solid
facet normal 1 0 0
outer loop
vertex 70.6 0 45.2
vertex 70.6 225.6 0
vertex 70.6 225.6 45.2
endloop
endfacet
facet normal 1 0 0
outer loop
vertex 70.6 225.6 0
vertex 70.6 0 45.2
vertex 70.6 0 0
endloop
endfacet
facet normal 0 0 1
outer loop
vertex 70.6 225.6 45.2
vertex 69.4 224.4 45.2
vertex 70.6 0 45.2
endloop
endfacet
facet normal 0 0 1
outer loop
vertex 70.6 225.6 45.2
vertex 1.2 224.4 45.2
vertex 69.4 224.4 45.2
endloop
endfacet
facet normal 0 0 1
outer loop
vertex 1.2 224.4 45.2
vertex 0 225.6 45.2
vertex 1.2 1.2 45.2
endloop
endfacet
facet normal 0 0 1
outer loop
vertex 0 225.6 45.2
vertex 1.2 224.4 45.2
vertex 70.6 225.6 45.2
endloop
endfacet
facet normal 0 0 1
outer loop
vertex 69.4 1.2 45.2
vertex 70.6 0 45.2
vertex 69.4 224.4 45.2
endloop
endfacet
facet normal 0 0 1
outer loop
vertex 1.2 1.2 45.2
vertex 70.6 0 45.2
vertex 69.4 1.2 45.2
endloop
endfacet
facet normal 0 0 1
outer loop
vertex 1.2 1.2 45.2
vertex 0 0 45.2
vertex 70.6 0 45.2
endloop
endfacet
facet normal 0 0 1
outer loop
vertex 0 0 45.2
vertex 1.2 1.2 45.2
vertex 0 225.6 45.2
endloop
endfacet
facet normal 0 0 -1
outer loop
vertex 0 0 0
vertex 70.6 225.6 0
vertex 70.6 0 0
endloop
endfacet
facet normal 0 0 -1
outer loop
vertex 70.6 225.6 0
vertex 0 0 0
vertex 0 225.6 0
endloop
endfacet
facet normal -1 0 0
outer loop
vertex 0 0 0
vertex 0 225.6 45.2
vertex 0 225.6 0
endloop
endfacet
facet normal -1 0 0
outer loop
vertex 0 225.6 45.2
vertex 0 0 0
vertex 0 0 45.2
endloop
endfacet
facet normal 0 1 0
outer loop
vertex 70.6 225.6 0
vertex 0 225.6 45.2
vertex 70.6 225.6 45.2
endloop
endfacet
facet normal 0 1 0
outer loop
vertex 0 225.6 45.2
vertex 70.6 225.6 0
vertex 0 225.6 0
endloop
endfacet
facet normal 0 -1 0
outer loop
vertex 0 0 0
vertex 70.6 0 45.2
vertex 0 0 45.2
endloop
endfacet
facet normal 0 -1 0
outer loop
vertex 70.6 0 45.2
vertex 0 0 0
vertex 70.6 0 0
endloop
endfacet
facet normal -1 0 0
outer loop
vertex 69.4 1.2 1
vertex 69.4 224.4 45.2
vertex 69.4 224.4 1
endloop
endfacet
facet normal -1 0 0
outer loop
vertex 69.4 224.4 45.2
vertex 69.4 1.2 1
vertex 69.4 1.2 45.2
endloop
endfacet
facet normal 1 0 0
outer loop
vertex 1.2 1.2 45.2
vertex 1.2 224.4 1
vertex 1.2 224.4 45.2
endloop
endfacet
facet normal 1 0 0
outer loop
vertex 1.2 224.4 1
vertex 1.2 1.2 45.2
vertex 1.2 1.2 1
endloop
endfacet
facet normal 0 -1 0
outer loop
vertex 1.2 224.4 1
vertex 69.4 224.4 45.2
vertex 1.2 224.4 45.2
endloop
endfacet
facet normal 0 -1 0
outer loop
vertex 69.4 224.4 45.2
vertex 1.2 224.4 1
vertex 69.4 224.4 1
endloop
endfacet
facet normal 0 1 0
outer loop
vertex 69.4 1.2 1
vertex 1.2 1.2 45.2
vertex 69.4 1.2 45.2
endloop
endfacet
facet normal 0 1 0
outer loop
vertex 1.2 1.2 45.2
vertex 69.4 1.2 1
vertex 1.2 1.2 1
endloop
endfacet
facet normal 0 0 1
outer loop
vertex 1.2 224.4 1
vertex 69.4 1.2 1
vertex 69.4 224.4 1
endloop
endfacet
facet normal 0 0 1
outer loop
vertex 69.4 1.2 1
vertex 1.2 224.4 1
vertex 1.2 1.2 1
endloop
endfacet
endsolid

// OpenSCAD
// Modulith (Jerrari Gen2) drawer insert generator
// Drop-in dividers for Modulith drawers, with or without a floor. Options follow Gridfinity Extended's
// basic cup where they apply (no lip, stacking, magnets or base pads).
// License: CC BY-NC-SA 4.0 (https://creativecommons.org/licenses/by-nc-sa/4.0/). Original work; not affiliated with Jerrari.
//
// Cavity formulas measured from the v2609 "decor drawer" STLs (59-270 deep, 1W-4W, 0.5H-2H):
//   width = 88*W - 17    depth = D - 14    height (floor top to rim) = 56*H - 7.8
// Drawer floor 1.8 thick, square cavity corners, no inside fillets or ribs. 2H drawers thin the side
// walls 0.4 mm mid-height; the rim still gates at 88W-17. Case: rim-to-ceiling gap 0.8 mm; stopper pins
// in the center floor rib hang 2 mm below the ceiling.
//
// Axes: X = width, Y = depth (Y=0 is the drawer front), Z up. Origin = outer front-left-bottom.
// Separator positions and spans may be given as negative percentages of the inner span (-50 = 50%).

/* [Drawer] */
// Modulith depth series
drawer_depth = 240; // [59, 115, 165, 185, 240, 270]
// Drawer width in Modulith units (1-4 measured, others extrapolated)
drawer_width = 1; // 0.5
// Drawer height in Modulith units (0.5-2 measured, others extrapolated)
drawer_height = 1; // [0.5, 1, 1.5, 2, 2.5, 3]
// Insert height; 0 = as tall as the drawer allows (see Fit Tweaking for headroom)
height = 0; // 0.1
// Case stopper pins hang into the drawer; when fitted, stopper depth is added to the headroom
drawer_stoppers = true;
// Curve smoothness of the model: draft renders fastest, fine is smoothest (slower)
quality = "normal"; // [draft, normal, fine]

/* [Perimeter Walls and Floor] */
// Outer wall thickness, mm. 0 = no outer walls, just dividers
wall_thickness = 1.2; // 0.1
// Floor thickness, mm. 0 = no floor
floor_thickness = 1.0; // 0.1

/* [Subdivisions] */
// Equal pockets across the width (dividers run front to back)
vertical_chambers = 1;
// Equal pockets front to back (dividers run left to right)
horizontal_chambers = 1;
// Place front-to-back dividers yourself instead of equally
vertical_irregular_subdivisions = false;
// Each divider: position from the left inner wall, or [position, from, to] for a partial divider measured
// from the front inner wall (to = 0 reaches the back). Negative values are percentages: -50 = 50%.
vertical_separator_config = [20, 45];
// Place left-to-right dividers yourself instead of equally
horizontal_irregular_subdivisions = false;
// Each divider: position from the front inner wall, or [position, from, to] measured from the left inner wall
horizontal_separator_config = [60, 120];

/* [Label] */
// normal = a shelf to stick a label on; pred = socket for pred's printable snap-in labels (Printables 592545)
label_style = "disabled"; // [disabled, normal, pred]
// Where the label sits along the wall; the *chamber options give every pocket its own label
label_position = "left"; // [left, right, center, leftchamber, rightchamber, centerchamber]
// Label shelf: width (0 = full wall or pocket), depth, height (0 = same as depth), edge radius; mm
label_size = [0, 14, 0, 0.8]; // 0.1
// Pocket in the shelf: width, depth, pocket depth; mm. 0 = fit the stock 1U pred label (normal: 0 = no pocket)
label_relief = [0, 0, 0]; // 0.1
// Outer walls that get labels: front, back, left, right
label_walls = [0, 1, 0, 0]; // [0:1:1]
// Labels on dividers too: on the front face of left-to-right dividers, the left face of front-to-back ones
label_dividers = "disabled"; // [disabled, horizontal, vertical, both]

/* [Finger Slide] */
// Rounded or sloped fill where the floor meets a wall, so small parts slide out to your fingers
fingerslide = "none"; // [none, rounded, chamfered]
// Size of the slide, mm; negative = a fraction of the pocket (-3 = one third)
fingerslide_radius = -3;
// Sides of each pocket that get a slide: front, back, left, right
fingerslide_walls = [1, 0, 0, 0]; // [0:1:1]

/* [Wall Cutout] */
// Finger notches in left-to-right walls: outer front/back and/or the dividers between pocket rows
wallcutout_vertical = "disabled"; // [disabled, enabled, inneronly, wallsonly, frontonly, backonly]
// Finger notches in front-to-back walls: outer left/right and/or the dividers between pocket columns
wallcutout_horizontal = "disabled"; // [disabled, enabled, inneronly, wallsonly, leftonly, rightonly]
// Where along each pocket, mm from its start; -2 = centered (other negatives = a fraction)
wallcutout_position = -2; // 0.1
// Notch width at its bottom, mm; 0 = half the pocket
wallcutout_width = 0; // 0.1
// Slope of the notch sides, degrees from horizontal
wallcutout_angle = 70;
// Notch depth from the top, mm; 0 = halfway down, -1 = to the floor
wallcutout_height = 0; // 0.1
// Rounding of the notch corners, mm
wallcutout_corner_radius = 5; // 0.1

/* [Bottom Text] */
// Engrave the drawer size on the underside (needs a floor)
text_1 = false;
// Engrave your own line too
text_2 = false;
text_2_text = "";
// Letter height, mm; 0 = automatic
text_size = 0; // 0.1
// Engraving depth, mm
text_depth = 0.3; // 0.01
text_font = "Liberation Sans";

/* [Fit Tweaking] */
// Fit slack: total mm removed from the insert's width and depth
clearance = [0.4, 0.4]; // 0.1
// Gap kept between the insert top and the drawer rim when height is 0 or a %; stopper depth is added to it if stoppers are on
headroom = 1.0; // 0.1
// How far the case stopper reaches below the ceiling, mm (used when drawer stoppers is on)
stopper_depth = 2; // 0.1
// Divider thickness at the bottom and top, mm; a thinner top makes a tapered divider
chamber_wall_thickness = [1.2, 1.2]; // 0.1
// Dividers end this far below the insert top, mm
chamber_wall_headroom = 0; // 0.1

/* [OpenSCAD Detail] */
// Expert override of quality: OpenSCAD $fa / $fs / $fn; 0 = set by quality
fa = 0;
fs = 0;
fn = 0;

/* [Hidden] */
q = quality == "draft" ? [12, 1] : quality == "fine" ? [3, 0.2] : [6, 0.4];   // [$fa, $fs] per quality
$fa = fa > 0 ? fa : q[0]; $fs = fs > 0 ? fs : q[1]; $fn = fn;
eps = 0.01;

// ---------------------------------------------------------------- derived sizes
cavity = [88 * drawer_width - 17, drawer_depth - 14, 56 * drawer_height - 7.8];
W = cavity.x - clearance.x;
D = cavity.y - clearance.y;
head = headroom + (drawer_stoppers ? stopper_depth : 0);
H = height > 0 ? height : (cavity.z - head) * (height < 0 ? -height / 100 : 1);
wt = wall_thickness;
ft = floor_thickness;
iw = W - 2 * wt;           // inner cavity of the insert
id = D - 2 * wt;
cwb = chamber_wall_thickness[0];
cwtop = chamber_wall_thickness[1];
sep_top = H - chamber_wall_headroom;

// separator centerlines, relative to the inner cavity origin
function equal_seps(n, len) = [for (i = [1 : 1 : n - 1]) i * (len - (n - 1) * cwb) / n + (i - 0.5) * cwb];
function rel(v, len) = v < 0 ? -v / 100 * len : v;                                    // -50 -> 50% of len
function sep_pos(e, across) = rel(is_list(e) ? e[0] : e, across);
// OpenSCAD has no sort(): quicksort the separator entries by position so they can be listed in any order
function by_pos(v, across) = len(v) <= 1 ? v : let (p = sep_pos(v[0], across), rest = [for (i = [1 : 1 : len(v) - 1]) v[i]])
    concat(by_pos([for (e = rest) if (sep_pos(e, across) < p) e], across), [v[0]], by_pos([for (e = rest) if (sep_pos(e, across) >= p) e], across));
xcfg = by_pos(vertical_irregular_subdivisions ? vertical_separator_config : equal_seps(vertical_chambers, iw), iw);
ycfg = by_pos(horizontal_irregular_subdivisions ? horizontal_separator_config : equal_seps(horizontal_chambers, id), id);
function sep_span(e, len) = is_list(e) ? [rel(e[1], len), e[2] == 0 ? len : rel(e[2], len)] : [0, len];   // [from, to] along the separator
xs = [for (e = xcfg) sep_pos(e, iw)];
ys = [for (e = ycfg) sep_pos(e, id)];
// several separators may share a position (different spans); grid lines are the distinct positions
function uniq(v) = [for (i = [0 : 1 : len(v) - 1]) if (i == 0 || v[i] - v[i - 1] > 0.01) v[i]];
// pockets along one wall face: the face's span split only at crossing separators that actually reach it.
// cross: crossing separators' configs/positions, cross_len: their length axis, at: this face's position on that
// axis, lo..hi: this wall's own span.
function touches(sp, at) = sp[0] <= at + 0.01 && sp[1] >= at - 0.01;
function wall_cells(cross, cross_pos, cross_len, at, lo, hi) = let (
    cuts = uniq([for (i = [0 : 1 : len(cross) - 1]) if (touches(sep_span(cross[i], cross_len), at) && cross_pos[i] > lo && cross_pos[i] < hi) cross_pos[i]]),
    edges = concat([lo], [for (c = cuts) each [c - cwb / 2, c + cwb / 2]], [hi]))
    [for (i = [0 : 2 : len(edges) - 2]) [edges[i], edges[i + 1]]];
// ponytail: cols x rows is still the full grid (chamber-size echo, slide radius). Wall-attached features (labels,
// slides, cutouts) use wall_cells() below, which only splits a wall where a separator really meets it.
// chamber spans [start, end] between separator faces
function spans(seps, len) = [for (i = [0 : len(seps)])
    [i == 0 ? 0 : seps[i - 1] + cwb / 2, i == len(seps) ? len : seps[i] - cwb / 2]];
uxs = uniq(xs); uys = uniq(ys);
cols = spans(uxs, iw);
rows = spans(uys, id);
function gi(v, list) = [for (i = [0 : 1 : len(list) - 1]) if (abs(list[i] - v) <= 0.01) i][0];   // grid-line index of a position

assert(search(drawer_depth, [59, 115, 165, 185, 240, 270]) != [], "drawer_depth must be 59/115/165/185/240/270");
assert(iw > 0 && id > 0 && H > ft, "insert has no interior");
assert(min([for (c = cols) c[1] - c[0]]) > 0 && min([for (r = rows) r[1] - r[0]]) > 0, "a chamber has zero or negative width");
assert(cwtop <= cwb, "chamber_wall_thickness top must be <= bottom (prints without support)");
assert(min(concat([1], [for (e = xcfg) let (sp = sep_span(e, id)) sp[1] - sp[0]], [for (e = ycfg) let (sp = sep_span(e, iw)) sp[1] - sp[0]])) > 0, "partial separator: 'to' must be beyond 'from'");

echo(str("Modulith ", drawer_depth, " ", drawer_width, "W ", drawer_height, "H  cavity=", cavity,
         "  insert=", [W, D, H], "  headroom=", head, "  chambers X=", [for (c = cols) c[1] - c[0]], " Y=", [for (r = rows) r[1] - r[0]]));

// ---------------------------------------------------------------- helpers
// Place children defined along +X (wall face at y=0, growing into +y, base at z=0) onto a wall.
// side: 0 front(+y), 1 back(-y), 2 left(+x), 3 right(-x). a0 = start along the wall, face = wall face coord.
module on_wall(side, a0, face, z) {
    if (side == 0) translate([a0, face, z]) children();
    if (side == 1) translate([a0, face, z]) mirror([0, 1, 0]) children();
    if (side == 2) translate([face, a0, z]) mirror([1, 0, 0]) rotate([0, 0, 90]) children();
    if (side == 3) translate([face, a0, z]) rotate([0, 0, 90]) children();
}
module prism_x(len) rotate([90, 0, 90]) linear_extrude(len) children();   // 2D (y,z) profile swept along +X

// chamber-side geometry: face coordinate of a chamber (c = column index, r = row index) on each side
function face(side, c, r) = side == 0 ? wt + rows[r][0] : side == 1 ? wt + rows[r][1]
                          : side == 2 ? wt + cols[c][0] : wt + cols[c][1];
function along(side, c, r) = side < 2 ? cols[c] : rows[r];      // span along the wall
function across(side, c, r) = side < 2 ? rows[r] : cols[c];     // span perpendicular to the wall

// position of a label of width lw within a span of length len
function label_offset(len, lw) =
    label_position == "right" || label_position == "rightchamber" ? len - lw
  : label_position == "center" || label_position == "centerchamber" ? (len - lw) / 2 : 0;
label_per_chamber = label_position == "leftchamber" || label_position == "rightchamber" || label_position == "centerchamber";
label_d = label_size[1];
label_h = label_size[2] == 0 ? label_d : label_size[2] == -1 ? label_d * 3 / 4 : label_size[2];
function label_w(len) = label_size[0] > 0 ? min(label_size[0], len) : len;

// ---------------------------------------------------------------- parts
// Floor. ponytail: flat slab; swap this body for a Gridfinity base / magnet pockets later.
module floor_slab() cube([W, D, ft]);

module perimeter() if (wt > 0) difference() {
    cube([W, D, H]);
    translate([wt, wt, -eps]) cube([iw, id, H + 2 * eps]);
}

// tapered separator: hull of a bottom slab and a top slab
module separator(along_y, pos, len) {
    hull() {
        translate(along_y ? [wt + pos - cwb / 2, wt, ft] : [wt, wt + pos - cwb / 2, ft])
            cube(along_y ? [cwb, len, eps] : [len, cwb, eps]);
        translate(along_y ? [wt + pos - cwtop / 2, wt, sep_top - eps] : [wt, wt + pos - cwtop / 2, sep_top - eps])
            cube(along_y ? [cwtop, len, eps] : [len, cwtop, eps]);
    }
}
module separators() {
    for (e = xcfg) let (sp = sep_span(e, id)) translate([0, sp[0], 0]) separator(true, sep_pos(e, iw), sp[1] - sp[0]);
    for (e = ycfg) let (sp = sep_span(e, iw)) translate([sp[0], 0, 0]) separator(false, sep_pos(e, id), sp[1] - sp[0]);
}

// label tab: 45-degree triangle rounded by r (GFX shape). pred cuts its socket into the top face:
// rounded pocket for the label body + a 6.7 mm slot 1 mm longer each side for the 1.9 x 5.7 snap tabs
// (measured from GridfinityBinLabel_X1_12_Blank.step: 37.8 x 11.5 x 0.8 overall, body 34.0). GFX's socket
// shape, but fixed to the stock label instead of stretched to the shelf width; X numbers equal GFX's for a 1U shelf.
label_r = label_size[3];
pred = label_style == "pred";
// socket [width, depth(Y), pocket depth]. pred: stock label; normal: sticker recess, off unless a pocket depth is given
sock_z = label_relief[2] > 0 ? label_relief[2] : pred ? 1 : 0;
sock_y = label_relief[1] > 0 ? label_relief[1] : pred ? 11.8 : label_d - label_r - 1.3;
function sock_x(len) = label_relief[0] > 0 ? label_relief[0] : pred ? 36.2 : len - 2;
sock_pad = pred ? 2 : 1;                  // tab length needed beyond the pocket: slots (1 each side) + 1 mm margin, or just the margin
socketed = sock_z > 0;
assert(!socketed || 2 * label_r >= sock_z + 0.6, "label socket: raise label_size[3] to >= (pocket depth + 0.6) / 2");
assert(!socketed || label_d - label_r - 0.3 - sock_y >= 0.5, "label socket: label_size[1] must be >= socket depth + radius + 0.8");

// positive: 45-degree triangle rounded by r (GFX shape), 0.05 overlap into the walls at each end
// (a tab that only touches a wall face leaves CGAL an internal interface)
module label_tab(len) translate([-0.05, 0, 0]) prism_x(len + 0.1)
    translate([0, -label_r]) offset(r = label_r) polygon([[0, 0], [label_d - label_r, 0], [0, -label_h]]);

// negative: pocket in the tab's top face, placed left/center/right inside the tab like the tab inside its wall.
// pred adds the 6.7 mm slots 1 mm past the pocket for the label's 1.9 x 5.7 snap tabs.
module label_socket(len) if (socketed) {
    sx = sock_x(len);
    assert(len >= sx + 2 * sock_pad, str("label socket needs ", sx + 2 * sock_pad, " mm of tab; this tab is ", len, " mm"));
    translate([sock_pad + label_offset(len - 2 * sock_pad, sx), label_d - label_r - 0.3 - sock_y, -sock_z]) {
        linear_extrude(sock_z + eps) offset(r = 1) offset(delta = -1) square([sx, sock_y]);
        if (pred) translate([-1, (sock_y - 6.7) / 2, 0]) cube([sx + 2, 6.7, sock_z + eps]);
    }
}

// one placement loop for both parts: part = "tab" (union) or "socket" (subtracted after the union, so a
// separator running under a tab never fills the pocket back in)
module label_part(part, len) { if (part == "tab") label_tab(len); else label_socket(len); }
module labels(part) if (label_style != "disabled") {
    // outer walls
    for (side = [0 : 3]) if (label_walls[side] != 0) {
        wall_face = side == 0 ? wt : side == 1 ? wt + id : side == 2 ? wt : wt + iw;
        chambers = !label_per_chamber ? (side < 2 ? [[0, iw]] : [[0, id]])
                 : side == 0 ? wall_cells(xcfg, xs, id, 0, 0, iw) : side == 1 ? wall_cells(xcfg, xs, id, id, 0, iw)
                 : side == 2 ? wall_cells(ycfg, ys, iw, 0, 0, id) : wall_cells(ycfg, ys, iw, iw, 0, id);
        for (ch = chambers) let (len = ch[1] - ch[0], lw = label_w(len))
            on_wall(side, wt + ch[0] + label_offset(len, lw), wall_face, H) label_part(part, lw);
    }
    // separators: horizontal ones carry a tab on the -Y face, vertical ones on the -X face, along their own span
    if (label_dividers == "horizontal" || label_dividers == "both")
        for (i = [0 : 1 : len(ys) - 1]) let (sp = sep_span(ycfg[i], iw))
            for (ch = label_per_chamber ? wall_cells(xcfg, xs, id, ys[i], sp[0], sp[1]) : [sp]) let (len = ch[1] - ch[0], lw = label_w(len))
                on_wall(1, wt + ch[0] + label_offset(len, lw), wt + ys[i] - cwtop / 2, sep_top) label_part(part, lw);
    if (label_dividers == "vertical" || label_dividers == "both")
        for (i = [0 : 1 : len(xs) - 1]) let (sp = sep_span(xcfg[i], id))
            for (ch = label_per_chamber ? wall_cells(ycfg, ys, iw, xs[i], sp[0], sp[1]) : [sp]) let (len = ch[1] - ch[0], lw = label_w(len))
                on_wall(3, wt + ch[0] + label_offset(len, lw), wt + xs[i] - cwtop / 2, sep_top) label_part(part, lw);
}

module slide_profile(r) {
    if (fingerslide == "rounded") difference() { square(r); translate([r, r]) circle(r); }
    if (fingerslide == "chamfered") polygon([[0, 0], [r, 0], [0, r]]);
}
// one fillet per physical wall face along the wall's real extent (outer walls: full span; separators: their span),
// so a partial separator leaves no gap in the fillet of the chamber it does not reach. Radius comes from the
// grid cell behind the face. Fillets under a crossing wall simply merge into it.
function slide_r(depth) = let (hgt = sep_top - ft, want = fingerslide_radius > 0 ? fingerslide_radius : min(hgt, depth) / abs(fingerslide_radius))
    min(want, hgt, depth / 2);
module finger_slides() if (fingerslide != "none") {
    // walls running along X (sides 0 front / 1 back): [face y, span along x, cell depth]
    fx = concat(
        fingerslide_walls[0] ? concat([[wt, [0, iw], rows[0][1] - rows[0][0]]],
            [for (i = [0 : 1 : len(ycfg) - 1]) let (r = rows[gi(ys[i], uys) + 1]) [wt + ys[i] + cwb / 2, sep_span(ycfg[i], iw), r[1] - r[0]]]) : [],
        []);
    for (w = fx) on_wall(0, wt + w[1][0], w[0], ft) prism_x(w[1][1] - w[1][0]) slide_profile(slide_r(w[2]));
    bx = fingerslide_walls[1] ? concat([[wt + id, [0, iw], rows[len(rows) - 1][1] - rows[len(rows) - 1][0]]],
            [for (i = [0 : 1 : len(ycfg) - 1]) let (r = rows[gi(ys[i], uys)]) [wt + ys[i] - cwb / 2, sep_span(ycfg[i], iw), r[1] - r[0]]]) : [];
    for (w = bx) on_wall(1, wt + w[1][0], w[0], ft) prism_x(w[1][1] - w[1][0]) slide_profile(slide_r(w[2]));
    // walls running along Y (sides 2 left / 3 right)
    lx = fingerslide_walls[2] ? concat([[wt, [0, id], cols[0][1] - cols[0][0]]],
            [for (i = [0 : 1 : len(xcfg) - 1]) let (c = cols[gi(xs[i], uxs) + 1]) [wt + xs[i] + cwb / 2, sep_span(xcfg[i], id), c[1] - c[0]]]) : [];
    for (w = lx) on_wall(2, wt + w[1][0], w[0], ft) prism_x(w[1][1] - w[1][0]) slide_profile(slide_r(w[2]));
    rx = fingerslide_walls[3] ? concat([[wt + iw, [0, id], cols[len(cols) - 1][1] - cols[len(cols) - 1][0]]],
            [for (i = [0 : 1 : len(xcfg) - 1]) let (c = cols[gi(xs[i], uxs)]) [wt + xs[i] - cwb / 2, sep_span(xcfg[i], id), c[1] - c[0]]]) : [];
    for (w = rx) on_wall(3, wt + w[1][0], w[0], ft) prism_x(w[1][1] - w[1][0]) slide_profile(slide_r(w[2]));
}

// GFX WallCutout: trapezoid notch, angled sides, filleted bottom corners, origin at the wall top center
module wall_cutout(lowerWidth, wallAngle, hgt, thickness, cornerRadius) {
    topHeight = cornerRadius * 4;
    topWidth = lowerWidth + (hgt / tan(wallAngle)) * 2;
    rotate([90, 0, 0]) translate([0, 0, -thickness / 2]) linear_extrude(thickness) intersection() {
        translate([0, -hgt / 2 + topHeight / 2]) square([topWidth + cornerRadius * 2, hgt + topHeight], true);
        offset(r = -cornerRadius) offset(r = 2 * cornerRadius) offset(r = -cornerRadius) union() {
            translate([0, topHeight / 2]) square([topWidth * 2, topHeight], true);
            hull() {
                translate([0, topHeight / 2]) square([topWidth, topHeight], true);
                translate([0, -hgt / 2]) square([lowerWidth, hgt], true);
            }
        }
    }
}
// walls to notch: [centerline, thickness] lists for each direction
function pick(mode, outer_near, outer_far, inner, near_name, far_name) =
    mode == "disabled" ? [] :
    concat(mode == "enabled" || mode == "wallsonly" || mode == near_name ? outer_near : [],
           mode == "enabled" || mode == "inneronly" ? inner : [],
           mode == "enabled" || mode == "wallsonly" || mode == far_name ? outer_far : []);
// [centerline, thickness, pockets along the wall]
cut_walls_x = pick(wallcutout_vertical, wt > 0 ? [[wt / 2, wt, wall_cells(xcfg, xs, id, 0, 0, iw)]] : [],
                   wt > 0 ? [[D - wt / 2, wt, wall_cells(xcfg, xs, id, id, 0, iw)]] : [],
                   [for (i = [0 : 1 : len(ys) - 1]) let (sp = sep_span(ycfg[i], iw)) [wt + ys[i], cwb, wall_cells(xcfg, xs, id, ys[i], sp[0], sp[1])]],
                   "frontonly", "backonly");
cut_walls_y = pick(wallcutout_horizontal, wt > 0 ? [[wt / 2, wt, wall_cells(ycfg, ys, iw, 0, 0, id)]] : [],
                   wt > 0 ? [[W - wt / 2, wt, wall_cells(ycfg, ys, iw, iw, 0, id)]] : [],
                   [for (i = [0 : 1 : len(xs) - 1]) let (sp = sep_span(xcfg[i], id)) [wt + xs[i], cwb, wall_cells(ycfg, ys, iw, xs[i], sp[0], sp[1])]],
                   "leftonly", "rightonly");
wall_h = H - ft;
cut_h = wallcutout_height == 0 ? wall_h / 2 : wallcutout_height == -1 ? wall_h
      : wallcutout_height < 0 ? wall_h / abs(wallcutout_height) : wallcutout_height;
function cut_pos(len) = wallcutout_position == -2 ? len / 2
                      : wallcutout_position < 0 ? len / abs(wallcutout_position) : wallcutout_position;
function cut_w(len) = wallcutout_width > 0 ? wallcutout_width : len / 2;

module wall_cutouts() {
    for (w = cut_walls_x, ch = w[2]) let (len = ch[1] - ch[0])
        translate([wt + ch[0] + cut_pos(len), w[0], H])
            wall_cutout(cut_w(len), wallcutout_angle, cut_h, w[1] + 2 * eps, wallcutout_corner_radius);
    for (w = cut_walls_y, ch = w[2]) let (len = ch[1] - ch[0])
        translate([w[0], wt + ch[0] + cut_pos(len), H]) rotate([0, 0, 90])
            wall_cutout(cut_w(len), wallcutout_angle, cut_h, w[1] + 2 * eps, wallcutout_corner_radius);
}

module bottom_text() if (ft > 0 && (text_1 || text_2)) {
    line1 = str(drawer_depth, " ", drawer_width, "W ", drawer_height, "H");
    ts = text_size > 0 ? text_size : min(7, iw / (0.72 * max(len(line1), len(text_2_text))));
    translate([W / 2, D / 2, -eps]) mirror([1, 0, 0]) linear_extrude(text_depth + eps) {
        if (text_1) translate([0, text_2 ? ts * 0.7 : 0]) text(line1, size = ts, font = text_font, halign = "center", valign = "center");
        if (text_2) translate([0, text_1 ? -ts * 0.7 : 0]) text(text_2_text, size = ts, font = text_font, halign = "center", valign = "center");
    }
}

// ---------------------------------------------------------------- assembly
module insert() difference() {
    union() {
        if (ft > 0) floor_slab();
        perimeter();
        separators();
        labels("tab");
        finger_slides();
    }
    labels("socket");
    wall_cutouts();
    bottom_text();
}

insert();
